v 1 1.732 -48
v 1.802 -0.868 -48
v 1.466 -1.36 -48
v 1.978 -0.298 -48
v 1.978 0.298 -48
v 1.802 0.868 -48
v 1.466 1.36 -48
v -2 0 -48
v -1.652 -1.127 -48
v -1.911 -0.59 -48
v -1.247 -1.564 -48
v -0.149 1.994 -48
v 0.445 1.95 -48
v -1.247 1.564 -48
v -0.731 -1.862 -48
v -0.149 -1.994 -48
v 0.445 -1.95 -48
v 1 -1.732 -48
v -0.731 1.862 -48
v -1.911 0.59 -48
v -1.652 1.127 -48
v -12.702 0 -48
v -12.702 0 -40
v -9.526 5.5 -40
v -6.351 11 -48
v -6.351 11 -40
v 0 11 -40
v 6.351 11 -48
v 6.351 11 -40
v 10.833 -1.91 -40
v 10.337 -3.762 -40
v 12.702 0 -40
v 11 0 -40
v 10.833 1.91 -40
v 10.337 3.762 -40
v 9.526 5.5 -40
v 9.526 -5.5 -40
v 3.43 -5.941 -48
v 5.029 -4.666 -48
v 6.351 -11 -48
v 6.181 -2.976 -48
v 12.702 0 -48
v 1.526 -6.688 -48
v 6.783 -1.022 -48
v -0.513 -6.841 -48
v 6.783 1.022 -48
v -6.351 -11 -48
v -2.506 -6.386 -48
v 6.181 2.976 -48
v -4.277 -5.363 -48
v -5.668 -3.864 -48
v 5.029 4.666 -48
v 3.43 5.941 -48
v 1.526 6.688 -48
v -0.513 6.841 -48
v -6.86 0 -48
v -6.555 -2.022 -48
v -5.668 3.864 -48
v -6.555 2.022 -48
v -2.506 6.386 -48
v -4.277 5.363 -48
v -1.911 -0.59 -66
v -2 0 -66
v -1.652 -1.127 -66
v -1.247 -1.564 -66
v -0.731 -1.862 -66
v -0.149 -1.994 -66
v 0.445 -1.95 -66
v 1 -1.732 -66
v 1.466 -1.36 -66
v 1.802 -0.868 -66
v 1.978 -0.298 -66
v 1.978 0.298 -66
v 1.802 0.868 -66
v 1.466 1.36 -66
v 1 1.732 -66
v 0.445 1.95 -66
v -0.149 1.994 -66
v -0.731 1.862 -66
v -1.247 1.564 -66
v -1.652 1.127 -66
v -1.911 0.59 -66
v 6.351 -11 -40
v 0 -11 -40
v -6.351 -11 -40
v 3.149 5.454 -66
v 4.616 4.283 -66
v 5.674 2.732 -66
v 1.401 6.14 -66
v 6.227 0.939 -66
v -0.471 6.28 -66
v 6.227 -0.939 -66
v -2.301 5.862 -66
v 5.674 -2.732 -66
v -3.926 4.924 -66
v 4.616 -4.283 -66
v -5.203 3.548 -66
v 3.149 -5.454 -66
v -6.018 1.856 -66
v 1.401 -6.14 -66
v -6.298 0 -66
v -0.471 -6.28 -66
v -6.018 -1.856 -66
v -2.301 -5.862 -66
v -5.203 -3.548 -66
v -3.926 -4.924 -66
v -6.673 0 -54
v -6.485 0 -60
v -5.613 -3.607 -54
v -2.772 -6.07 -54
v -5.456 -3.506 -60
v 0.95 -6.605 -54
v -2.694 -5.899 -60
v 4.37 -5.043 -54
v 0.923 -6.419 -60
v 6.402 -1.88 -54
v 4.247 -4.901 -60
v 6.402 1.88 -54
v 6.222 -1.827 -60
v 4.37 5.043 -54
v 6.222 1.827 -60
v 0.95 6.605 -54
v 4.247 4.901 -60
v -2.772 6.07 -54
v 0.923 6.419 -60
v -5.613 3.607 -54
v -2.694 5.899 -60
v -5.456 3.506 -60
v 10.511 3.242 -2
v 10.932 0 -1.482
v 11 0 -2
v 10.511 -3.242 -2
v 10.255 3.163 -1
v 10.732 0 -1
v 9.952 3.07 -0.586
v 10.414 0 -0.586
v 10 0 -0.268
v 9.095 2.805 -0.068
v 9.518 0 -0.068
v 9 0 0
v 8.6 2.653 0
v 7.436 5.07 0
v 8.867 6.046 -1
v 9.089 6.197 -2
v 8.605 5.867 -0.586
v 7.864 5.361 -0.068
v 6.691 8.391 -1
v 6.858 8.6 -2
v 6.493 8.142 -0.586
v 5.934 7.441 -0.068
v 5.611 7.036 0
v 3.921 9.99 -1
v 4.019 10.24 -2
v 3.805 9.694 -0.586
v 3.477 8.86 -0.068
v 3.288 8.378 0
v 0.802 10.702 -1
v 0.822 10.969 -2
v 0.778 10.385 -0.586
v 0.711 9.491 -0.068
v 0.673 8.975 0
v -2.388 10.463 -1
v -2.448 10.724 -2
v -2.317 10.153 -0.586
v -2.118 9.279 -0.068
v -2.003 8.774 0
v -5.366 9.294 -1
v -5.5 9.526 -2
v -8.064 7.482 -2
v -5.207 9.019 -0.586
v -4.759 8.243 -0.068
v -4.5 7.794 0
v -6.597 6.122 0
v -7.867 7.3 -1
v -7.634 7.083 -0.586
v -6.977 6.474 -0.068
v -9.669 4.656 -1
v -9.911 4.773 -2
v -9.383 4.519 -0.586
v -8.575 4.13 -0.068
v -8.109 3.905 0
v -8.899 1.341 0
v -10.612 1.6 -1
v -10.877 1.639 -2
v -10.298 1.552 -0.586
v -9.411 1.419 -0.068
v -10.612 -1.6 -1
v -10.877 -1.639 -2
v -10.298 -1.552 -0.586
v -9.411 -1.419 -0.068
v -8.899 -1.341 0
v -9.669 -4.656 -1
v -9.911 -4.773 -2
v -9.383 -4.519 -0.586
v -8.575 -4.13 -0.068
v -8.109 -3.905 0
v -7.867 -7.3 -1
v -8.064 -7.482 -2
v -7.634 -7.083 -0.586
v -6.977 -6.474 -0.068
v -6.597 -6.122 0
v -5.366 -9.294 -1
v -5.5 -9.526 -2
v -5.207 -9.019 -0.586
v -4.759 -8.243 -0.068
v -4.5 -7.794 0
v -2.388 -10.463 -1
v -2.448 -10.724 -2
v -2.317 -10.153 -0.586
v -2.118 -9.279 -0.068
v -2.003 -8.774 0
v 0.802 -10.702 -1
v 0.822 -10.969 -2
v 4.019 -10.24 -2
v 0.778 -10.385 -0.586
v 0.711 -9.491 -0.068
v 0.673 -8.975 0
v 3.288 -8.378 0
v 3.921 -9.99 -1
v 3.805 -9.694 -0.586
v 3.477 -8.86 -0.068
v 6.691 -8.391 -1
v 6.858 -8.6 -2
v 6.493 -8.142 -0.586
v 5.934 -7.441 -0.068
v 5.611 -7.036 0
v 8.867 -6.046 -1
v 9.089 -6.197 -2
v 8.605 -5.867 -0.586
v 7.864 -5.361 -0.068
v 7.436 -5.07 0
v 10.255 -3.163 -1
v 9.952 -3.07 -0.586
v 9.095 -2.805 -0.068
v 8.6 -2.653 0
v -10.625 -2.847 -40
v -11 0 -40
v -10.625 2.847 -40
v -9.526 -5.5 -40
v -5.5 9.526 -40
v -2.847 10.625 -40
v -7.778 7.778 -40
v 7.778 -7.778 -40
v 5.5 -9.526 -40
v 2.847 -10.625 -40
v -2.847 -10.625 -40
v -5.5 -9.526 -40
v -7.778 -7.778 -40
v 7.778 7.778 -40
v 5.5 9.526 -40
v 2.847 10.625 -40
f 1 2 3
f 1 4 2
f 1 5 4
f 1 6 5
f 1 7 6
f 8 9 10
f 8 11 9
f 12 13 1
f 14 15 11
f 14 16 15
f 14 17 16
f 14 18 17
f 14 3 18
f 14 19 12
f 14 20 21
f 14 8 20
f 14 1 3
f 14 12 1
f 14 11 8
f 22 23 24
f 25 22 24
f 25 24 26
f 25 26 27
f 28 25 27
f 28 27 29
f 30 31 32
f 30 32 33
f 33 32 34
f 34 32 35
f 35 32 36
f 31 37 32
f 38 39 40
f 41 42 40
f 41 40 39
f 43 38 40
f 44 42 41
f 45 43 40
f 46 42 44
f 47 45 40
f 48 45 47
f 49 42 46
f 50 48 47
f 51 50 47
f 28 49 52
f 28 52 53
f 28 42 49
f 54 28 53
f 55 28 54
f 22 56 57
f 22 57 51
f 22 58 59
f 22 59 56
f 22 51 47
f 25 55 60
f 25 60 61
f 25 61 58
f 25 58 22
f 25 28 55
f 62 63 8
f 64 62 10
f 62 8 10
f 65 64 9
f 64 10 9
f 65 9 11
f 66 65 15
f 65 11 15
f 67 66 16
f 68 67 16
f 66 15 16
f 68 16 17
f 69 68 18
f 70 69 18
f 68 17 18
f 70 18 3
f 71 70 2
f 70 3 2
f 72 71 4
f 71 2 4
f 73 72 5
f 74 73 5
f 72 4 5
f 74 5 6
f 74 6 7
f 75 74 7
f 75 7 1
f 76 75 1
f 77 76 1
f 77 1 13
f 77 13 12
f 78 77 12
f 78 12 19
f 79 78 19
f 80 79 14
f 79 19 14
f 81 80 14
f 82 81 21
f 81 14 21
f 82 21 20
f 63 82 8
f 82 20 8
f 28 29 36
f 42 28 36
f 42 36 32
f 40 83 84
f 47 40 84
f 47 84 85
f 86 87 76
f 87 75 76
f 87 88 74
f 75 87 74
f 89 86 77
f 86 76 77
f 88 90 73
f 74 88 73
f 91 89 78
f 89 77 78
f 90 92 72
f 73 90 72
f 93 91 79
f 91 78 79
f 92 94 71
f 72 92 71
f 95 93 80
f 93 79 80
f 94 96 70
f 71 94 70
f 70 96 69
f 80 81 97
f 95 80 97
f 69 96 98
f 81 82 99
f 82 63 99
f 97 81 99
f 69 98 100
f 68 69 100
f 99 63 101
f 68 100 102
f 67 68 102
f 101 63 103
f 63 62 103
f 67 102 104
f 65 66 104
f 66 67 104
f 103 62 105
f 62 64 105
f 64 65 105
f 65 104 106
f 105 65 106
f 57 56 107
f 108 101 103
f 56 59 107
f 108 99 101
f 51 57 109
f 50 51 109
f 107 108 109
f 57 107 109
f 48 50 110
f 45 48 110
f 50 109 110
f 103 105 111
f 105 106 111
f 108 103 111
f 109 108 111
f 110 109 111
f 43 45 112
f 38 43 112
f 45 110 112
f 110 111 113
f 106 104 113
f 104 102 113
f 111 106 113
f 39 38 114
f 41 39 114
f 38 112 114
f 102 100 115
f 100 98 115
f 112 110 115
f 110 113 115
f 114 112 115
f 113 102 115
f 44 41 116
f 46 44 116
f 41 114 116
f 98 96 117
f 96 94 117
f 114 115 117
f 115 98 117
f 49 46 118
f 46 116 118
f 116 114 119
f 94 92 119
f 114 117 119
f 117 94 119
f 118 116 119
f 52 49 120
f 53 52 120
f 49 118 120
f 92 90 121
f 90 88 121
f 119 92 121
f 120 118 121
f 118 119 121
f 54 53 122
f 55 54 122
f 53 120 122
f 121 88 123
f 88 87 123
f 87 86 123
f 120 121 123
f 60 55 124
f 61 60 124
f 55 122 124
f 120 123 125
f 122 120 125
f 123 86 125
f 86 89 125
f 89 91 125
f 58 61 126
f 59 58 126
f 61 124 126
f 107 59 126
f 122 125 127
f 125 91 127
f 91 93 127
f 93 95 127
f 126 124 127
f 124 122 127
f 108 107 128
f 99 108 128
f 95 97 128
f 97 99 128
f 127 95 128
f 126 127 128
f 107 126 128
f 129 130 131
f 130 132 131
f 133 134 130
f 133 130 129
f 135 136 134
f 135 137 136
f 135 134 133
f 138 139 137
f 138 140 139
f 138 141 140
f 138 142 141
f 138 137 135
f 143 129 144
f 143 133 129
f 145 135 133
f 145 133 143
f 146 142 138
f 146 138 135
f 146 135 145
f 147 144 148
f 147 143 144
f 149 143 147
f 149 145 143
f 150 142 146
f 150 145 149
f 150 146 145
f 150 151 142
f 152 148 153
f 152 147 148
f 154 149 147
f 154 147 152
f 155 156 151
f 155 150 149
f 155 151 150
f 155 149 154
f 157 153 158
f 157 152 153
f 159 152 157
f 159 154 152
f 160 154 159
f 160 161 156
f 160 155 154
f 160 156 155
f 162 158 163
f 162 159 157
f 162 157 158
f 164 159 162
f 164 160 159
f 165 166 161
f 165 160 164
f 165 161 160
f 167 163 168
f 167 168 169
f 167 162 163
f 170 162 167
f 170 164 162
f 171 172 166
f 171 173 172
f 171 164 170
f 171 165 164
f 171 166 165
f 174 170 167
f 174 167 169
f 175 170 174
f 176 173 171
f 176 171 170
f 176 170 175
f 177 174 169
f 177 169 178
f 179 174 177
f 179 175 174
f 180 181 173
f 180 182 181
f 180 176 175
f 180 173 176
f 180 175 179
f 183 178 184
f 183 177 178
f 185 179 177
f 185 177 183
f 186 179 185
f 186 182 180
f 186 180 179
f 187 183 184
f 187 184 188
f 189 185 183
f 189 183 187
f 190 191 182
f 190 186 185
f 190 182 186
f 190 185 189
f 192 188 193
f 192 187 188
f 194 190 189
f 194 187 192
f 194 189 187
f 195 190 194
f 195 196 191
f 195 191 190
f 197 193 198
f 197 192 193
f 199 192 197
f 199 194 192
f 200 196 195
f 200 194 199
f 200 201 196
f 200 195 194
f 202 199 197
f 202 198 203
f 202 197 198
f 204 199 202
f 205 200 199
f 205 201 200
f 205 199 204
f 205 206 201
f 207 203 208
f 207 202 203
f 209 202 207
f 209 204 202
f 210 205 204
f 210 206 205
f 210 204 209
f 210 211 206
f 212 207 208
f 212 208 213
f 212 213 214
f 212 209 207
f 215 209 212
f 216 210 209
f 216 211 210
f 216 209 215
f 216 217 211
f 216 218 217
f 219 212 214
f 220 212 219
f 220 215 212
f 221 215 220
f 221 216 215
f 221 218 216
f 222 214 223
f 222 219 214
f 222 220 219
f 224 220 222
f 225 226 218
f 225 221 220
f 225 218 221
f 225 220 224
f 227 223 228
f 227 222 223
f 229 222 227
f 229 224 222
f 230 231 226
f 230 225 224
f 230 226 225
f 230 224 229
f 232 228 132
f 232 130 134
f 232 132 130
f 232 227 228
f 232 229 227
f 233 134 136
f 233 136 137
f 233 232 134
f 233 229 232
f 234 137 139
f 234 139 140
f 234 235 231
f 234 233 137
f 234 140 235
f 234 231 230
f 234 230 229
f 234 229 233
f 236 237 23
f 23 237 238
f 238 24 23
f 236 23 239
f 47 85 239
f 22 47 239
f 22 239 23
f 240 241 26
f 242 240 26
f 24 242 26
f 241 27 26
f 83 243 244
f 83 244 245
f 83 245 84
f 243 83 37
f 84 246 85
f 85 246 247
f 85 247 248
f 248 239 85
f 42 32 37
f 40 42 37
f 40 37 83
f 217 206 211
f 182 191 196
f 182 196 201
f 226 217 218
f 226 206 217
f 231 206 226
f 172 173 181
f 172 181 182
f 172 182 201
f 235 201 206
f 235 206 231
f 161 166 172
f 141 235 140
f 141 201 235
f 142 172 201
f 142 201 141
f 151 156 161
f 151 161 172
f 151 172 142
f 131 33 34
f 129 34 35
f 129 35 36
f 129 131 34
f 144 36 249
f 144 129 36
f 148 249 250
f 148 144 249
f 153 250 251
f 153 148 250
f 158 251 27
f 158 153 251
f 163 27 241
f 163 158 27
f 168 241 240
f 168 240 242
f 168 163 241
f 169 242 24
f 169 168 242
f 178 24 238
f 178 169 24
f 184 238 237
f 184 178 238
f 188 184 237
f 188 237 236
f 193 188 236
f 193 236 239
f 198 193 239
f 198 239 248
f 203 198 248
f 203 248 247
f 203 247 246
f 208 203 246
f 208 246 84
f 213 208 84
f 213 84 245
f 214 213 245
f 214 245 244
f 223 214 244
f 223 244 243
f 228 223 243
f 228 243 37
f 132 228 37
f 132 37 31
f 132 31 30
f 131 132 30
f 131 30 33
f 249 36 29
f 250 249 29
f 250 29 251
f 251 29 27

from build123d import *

# Parameters (mm, degrees)
SKETCH1_R           = 11
BOSS_EXTRUDE1_DEPTH = 40
BOSS_EXTRUDE2_DEPTH = 8
FILLET1_R           = 2


with BuildPart() as part:
    # Sketch1 → Boss-Extrude1 (new body)
    with BuildSketch(Plane.XY):
        Circle(SKETCH1_R)
    extrude(amount=-BOSS_EXTRUDE1_DEPTH)

    # Sketch2 → Boss-Extrude2 (add)
    with BuildSketch(Plane(origin=(0, 0, -40), x_dir=(-1, 0, 0), z_dir=(0, 0, -1))):
        Polygon((6.350852961, 11), (-6.350852961, 11), (-12.701705922, 0), (-6.350852961, -11), (6.350852961, -11), (12.701705922, 0), align=None)
    extrude(amount=BOSS_EXTRUDE2_DEPTH)

    # Sketch6 → Revolve1 (revolve)
    with BuildSketch(Plane(origin=(0, 0, 0), x_dir=(0, 0, -1), z_dir=(1, 0, 0)), mode=Mode.PRIVATE) as revolve1_sk:
        Polygon((48, 6.86), (66, 6.297503336), (66, 2), (48, 2), align=None)
    revolve(revolve1_sk.sketch.rotate(Axis((0, 0, 0), (0, 0, 1)), 90), axis=Axis((0, 0, 0), (0, 0, 1)))

    # Fillet1
    fillet1_edges = [part.edges().sort_by_distance(p)[0] for p in [
        (-11, 0, 0),
    ]]
    fillet(fillet1_edges, radius=FILLET1_R)


solid = part.part
